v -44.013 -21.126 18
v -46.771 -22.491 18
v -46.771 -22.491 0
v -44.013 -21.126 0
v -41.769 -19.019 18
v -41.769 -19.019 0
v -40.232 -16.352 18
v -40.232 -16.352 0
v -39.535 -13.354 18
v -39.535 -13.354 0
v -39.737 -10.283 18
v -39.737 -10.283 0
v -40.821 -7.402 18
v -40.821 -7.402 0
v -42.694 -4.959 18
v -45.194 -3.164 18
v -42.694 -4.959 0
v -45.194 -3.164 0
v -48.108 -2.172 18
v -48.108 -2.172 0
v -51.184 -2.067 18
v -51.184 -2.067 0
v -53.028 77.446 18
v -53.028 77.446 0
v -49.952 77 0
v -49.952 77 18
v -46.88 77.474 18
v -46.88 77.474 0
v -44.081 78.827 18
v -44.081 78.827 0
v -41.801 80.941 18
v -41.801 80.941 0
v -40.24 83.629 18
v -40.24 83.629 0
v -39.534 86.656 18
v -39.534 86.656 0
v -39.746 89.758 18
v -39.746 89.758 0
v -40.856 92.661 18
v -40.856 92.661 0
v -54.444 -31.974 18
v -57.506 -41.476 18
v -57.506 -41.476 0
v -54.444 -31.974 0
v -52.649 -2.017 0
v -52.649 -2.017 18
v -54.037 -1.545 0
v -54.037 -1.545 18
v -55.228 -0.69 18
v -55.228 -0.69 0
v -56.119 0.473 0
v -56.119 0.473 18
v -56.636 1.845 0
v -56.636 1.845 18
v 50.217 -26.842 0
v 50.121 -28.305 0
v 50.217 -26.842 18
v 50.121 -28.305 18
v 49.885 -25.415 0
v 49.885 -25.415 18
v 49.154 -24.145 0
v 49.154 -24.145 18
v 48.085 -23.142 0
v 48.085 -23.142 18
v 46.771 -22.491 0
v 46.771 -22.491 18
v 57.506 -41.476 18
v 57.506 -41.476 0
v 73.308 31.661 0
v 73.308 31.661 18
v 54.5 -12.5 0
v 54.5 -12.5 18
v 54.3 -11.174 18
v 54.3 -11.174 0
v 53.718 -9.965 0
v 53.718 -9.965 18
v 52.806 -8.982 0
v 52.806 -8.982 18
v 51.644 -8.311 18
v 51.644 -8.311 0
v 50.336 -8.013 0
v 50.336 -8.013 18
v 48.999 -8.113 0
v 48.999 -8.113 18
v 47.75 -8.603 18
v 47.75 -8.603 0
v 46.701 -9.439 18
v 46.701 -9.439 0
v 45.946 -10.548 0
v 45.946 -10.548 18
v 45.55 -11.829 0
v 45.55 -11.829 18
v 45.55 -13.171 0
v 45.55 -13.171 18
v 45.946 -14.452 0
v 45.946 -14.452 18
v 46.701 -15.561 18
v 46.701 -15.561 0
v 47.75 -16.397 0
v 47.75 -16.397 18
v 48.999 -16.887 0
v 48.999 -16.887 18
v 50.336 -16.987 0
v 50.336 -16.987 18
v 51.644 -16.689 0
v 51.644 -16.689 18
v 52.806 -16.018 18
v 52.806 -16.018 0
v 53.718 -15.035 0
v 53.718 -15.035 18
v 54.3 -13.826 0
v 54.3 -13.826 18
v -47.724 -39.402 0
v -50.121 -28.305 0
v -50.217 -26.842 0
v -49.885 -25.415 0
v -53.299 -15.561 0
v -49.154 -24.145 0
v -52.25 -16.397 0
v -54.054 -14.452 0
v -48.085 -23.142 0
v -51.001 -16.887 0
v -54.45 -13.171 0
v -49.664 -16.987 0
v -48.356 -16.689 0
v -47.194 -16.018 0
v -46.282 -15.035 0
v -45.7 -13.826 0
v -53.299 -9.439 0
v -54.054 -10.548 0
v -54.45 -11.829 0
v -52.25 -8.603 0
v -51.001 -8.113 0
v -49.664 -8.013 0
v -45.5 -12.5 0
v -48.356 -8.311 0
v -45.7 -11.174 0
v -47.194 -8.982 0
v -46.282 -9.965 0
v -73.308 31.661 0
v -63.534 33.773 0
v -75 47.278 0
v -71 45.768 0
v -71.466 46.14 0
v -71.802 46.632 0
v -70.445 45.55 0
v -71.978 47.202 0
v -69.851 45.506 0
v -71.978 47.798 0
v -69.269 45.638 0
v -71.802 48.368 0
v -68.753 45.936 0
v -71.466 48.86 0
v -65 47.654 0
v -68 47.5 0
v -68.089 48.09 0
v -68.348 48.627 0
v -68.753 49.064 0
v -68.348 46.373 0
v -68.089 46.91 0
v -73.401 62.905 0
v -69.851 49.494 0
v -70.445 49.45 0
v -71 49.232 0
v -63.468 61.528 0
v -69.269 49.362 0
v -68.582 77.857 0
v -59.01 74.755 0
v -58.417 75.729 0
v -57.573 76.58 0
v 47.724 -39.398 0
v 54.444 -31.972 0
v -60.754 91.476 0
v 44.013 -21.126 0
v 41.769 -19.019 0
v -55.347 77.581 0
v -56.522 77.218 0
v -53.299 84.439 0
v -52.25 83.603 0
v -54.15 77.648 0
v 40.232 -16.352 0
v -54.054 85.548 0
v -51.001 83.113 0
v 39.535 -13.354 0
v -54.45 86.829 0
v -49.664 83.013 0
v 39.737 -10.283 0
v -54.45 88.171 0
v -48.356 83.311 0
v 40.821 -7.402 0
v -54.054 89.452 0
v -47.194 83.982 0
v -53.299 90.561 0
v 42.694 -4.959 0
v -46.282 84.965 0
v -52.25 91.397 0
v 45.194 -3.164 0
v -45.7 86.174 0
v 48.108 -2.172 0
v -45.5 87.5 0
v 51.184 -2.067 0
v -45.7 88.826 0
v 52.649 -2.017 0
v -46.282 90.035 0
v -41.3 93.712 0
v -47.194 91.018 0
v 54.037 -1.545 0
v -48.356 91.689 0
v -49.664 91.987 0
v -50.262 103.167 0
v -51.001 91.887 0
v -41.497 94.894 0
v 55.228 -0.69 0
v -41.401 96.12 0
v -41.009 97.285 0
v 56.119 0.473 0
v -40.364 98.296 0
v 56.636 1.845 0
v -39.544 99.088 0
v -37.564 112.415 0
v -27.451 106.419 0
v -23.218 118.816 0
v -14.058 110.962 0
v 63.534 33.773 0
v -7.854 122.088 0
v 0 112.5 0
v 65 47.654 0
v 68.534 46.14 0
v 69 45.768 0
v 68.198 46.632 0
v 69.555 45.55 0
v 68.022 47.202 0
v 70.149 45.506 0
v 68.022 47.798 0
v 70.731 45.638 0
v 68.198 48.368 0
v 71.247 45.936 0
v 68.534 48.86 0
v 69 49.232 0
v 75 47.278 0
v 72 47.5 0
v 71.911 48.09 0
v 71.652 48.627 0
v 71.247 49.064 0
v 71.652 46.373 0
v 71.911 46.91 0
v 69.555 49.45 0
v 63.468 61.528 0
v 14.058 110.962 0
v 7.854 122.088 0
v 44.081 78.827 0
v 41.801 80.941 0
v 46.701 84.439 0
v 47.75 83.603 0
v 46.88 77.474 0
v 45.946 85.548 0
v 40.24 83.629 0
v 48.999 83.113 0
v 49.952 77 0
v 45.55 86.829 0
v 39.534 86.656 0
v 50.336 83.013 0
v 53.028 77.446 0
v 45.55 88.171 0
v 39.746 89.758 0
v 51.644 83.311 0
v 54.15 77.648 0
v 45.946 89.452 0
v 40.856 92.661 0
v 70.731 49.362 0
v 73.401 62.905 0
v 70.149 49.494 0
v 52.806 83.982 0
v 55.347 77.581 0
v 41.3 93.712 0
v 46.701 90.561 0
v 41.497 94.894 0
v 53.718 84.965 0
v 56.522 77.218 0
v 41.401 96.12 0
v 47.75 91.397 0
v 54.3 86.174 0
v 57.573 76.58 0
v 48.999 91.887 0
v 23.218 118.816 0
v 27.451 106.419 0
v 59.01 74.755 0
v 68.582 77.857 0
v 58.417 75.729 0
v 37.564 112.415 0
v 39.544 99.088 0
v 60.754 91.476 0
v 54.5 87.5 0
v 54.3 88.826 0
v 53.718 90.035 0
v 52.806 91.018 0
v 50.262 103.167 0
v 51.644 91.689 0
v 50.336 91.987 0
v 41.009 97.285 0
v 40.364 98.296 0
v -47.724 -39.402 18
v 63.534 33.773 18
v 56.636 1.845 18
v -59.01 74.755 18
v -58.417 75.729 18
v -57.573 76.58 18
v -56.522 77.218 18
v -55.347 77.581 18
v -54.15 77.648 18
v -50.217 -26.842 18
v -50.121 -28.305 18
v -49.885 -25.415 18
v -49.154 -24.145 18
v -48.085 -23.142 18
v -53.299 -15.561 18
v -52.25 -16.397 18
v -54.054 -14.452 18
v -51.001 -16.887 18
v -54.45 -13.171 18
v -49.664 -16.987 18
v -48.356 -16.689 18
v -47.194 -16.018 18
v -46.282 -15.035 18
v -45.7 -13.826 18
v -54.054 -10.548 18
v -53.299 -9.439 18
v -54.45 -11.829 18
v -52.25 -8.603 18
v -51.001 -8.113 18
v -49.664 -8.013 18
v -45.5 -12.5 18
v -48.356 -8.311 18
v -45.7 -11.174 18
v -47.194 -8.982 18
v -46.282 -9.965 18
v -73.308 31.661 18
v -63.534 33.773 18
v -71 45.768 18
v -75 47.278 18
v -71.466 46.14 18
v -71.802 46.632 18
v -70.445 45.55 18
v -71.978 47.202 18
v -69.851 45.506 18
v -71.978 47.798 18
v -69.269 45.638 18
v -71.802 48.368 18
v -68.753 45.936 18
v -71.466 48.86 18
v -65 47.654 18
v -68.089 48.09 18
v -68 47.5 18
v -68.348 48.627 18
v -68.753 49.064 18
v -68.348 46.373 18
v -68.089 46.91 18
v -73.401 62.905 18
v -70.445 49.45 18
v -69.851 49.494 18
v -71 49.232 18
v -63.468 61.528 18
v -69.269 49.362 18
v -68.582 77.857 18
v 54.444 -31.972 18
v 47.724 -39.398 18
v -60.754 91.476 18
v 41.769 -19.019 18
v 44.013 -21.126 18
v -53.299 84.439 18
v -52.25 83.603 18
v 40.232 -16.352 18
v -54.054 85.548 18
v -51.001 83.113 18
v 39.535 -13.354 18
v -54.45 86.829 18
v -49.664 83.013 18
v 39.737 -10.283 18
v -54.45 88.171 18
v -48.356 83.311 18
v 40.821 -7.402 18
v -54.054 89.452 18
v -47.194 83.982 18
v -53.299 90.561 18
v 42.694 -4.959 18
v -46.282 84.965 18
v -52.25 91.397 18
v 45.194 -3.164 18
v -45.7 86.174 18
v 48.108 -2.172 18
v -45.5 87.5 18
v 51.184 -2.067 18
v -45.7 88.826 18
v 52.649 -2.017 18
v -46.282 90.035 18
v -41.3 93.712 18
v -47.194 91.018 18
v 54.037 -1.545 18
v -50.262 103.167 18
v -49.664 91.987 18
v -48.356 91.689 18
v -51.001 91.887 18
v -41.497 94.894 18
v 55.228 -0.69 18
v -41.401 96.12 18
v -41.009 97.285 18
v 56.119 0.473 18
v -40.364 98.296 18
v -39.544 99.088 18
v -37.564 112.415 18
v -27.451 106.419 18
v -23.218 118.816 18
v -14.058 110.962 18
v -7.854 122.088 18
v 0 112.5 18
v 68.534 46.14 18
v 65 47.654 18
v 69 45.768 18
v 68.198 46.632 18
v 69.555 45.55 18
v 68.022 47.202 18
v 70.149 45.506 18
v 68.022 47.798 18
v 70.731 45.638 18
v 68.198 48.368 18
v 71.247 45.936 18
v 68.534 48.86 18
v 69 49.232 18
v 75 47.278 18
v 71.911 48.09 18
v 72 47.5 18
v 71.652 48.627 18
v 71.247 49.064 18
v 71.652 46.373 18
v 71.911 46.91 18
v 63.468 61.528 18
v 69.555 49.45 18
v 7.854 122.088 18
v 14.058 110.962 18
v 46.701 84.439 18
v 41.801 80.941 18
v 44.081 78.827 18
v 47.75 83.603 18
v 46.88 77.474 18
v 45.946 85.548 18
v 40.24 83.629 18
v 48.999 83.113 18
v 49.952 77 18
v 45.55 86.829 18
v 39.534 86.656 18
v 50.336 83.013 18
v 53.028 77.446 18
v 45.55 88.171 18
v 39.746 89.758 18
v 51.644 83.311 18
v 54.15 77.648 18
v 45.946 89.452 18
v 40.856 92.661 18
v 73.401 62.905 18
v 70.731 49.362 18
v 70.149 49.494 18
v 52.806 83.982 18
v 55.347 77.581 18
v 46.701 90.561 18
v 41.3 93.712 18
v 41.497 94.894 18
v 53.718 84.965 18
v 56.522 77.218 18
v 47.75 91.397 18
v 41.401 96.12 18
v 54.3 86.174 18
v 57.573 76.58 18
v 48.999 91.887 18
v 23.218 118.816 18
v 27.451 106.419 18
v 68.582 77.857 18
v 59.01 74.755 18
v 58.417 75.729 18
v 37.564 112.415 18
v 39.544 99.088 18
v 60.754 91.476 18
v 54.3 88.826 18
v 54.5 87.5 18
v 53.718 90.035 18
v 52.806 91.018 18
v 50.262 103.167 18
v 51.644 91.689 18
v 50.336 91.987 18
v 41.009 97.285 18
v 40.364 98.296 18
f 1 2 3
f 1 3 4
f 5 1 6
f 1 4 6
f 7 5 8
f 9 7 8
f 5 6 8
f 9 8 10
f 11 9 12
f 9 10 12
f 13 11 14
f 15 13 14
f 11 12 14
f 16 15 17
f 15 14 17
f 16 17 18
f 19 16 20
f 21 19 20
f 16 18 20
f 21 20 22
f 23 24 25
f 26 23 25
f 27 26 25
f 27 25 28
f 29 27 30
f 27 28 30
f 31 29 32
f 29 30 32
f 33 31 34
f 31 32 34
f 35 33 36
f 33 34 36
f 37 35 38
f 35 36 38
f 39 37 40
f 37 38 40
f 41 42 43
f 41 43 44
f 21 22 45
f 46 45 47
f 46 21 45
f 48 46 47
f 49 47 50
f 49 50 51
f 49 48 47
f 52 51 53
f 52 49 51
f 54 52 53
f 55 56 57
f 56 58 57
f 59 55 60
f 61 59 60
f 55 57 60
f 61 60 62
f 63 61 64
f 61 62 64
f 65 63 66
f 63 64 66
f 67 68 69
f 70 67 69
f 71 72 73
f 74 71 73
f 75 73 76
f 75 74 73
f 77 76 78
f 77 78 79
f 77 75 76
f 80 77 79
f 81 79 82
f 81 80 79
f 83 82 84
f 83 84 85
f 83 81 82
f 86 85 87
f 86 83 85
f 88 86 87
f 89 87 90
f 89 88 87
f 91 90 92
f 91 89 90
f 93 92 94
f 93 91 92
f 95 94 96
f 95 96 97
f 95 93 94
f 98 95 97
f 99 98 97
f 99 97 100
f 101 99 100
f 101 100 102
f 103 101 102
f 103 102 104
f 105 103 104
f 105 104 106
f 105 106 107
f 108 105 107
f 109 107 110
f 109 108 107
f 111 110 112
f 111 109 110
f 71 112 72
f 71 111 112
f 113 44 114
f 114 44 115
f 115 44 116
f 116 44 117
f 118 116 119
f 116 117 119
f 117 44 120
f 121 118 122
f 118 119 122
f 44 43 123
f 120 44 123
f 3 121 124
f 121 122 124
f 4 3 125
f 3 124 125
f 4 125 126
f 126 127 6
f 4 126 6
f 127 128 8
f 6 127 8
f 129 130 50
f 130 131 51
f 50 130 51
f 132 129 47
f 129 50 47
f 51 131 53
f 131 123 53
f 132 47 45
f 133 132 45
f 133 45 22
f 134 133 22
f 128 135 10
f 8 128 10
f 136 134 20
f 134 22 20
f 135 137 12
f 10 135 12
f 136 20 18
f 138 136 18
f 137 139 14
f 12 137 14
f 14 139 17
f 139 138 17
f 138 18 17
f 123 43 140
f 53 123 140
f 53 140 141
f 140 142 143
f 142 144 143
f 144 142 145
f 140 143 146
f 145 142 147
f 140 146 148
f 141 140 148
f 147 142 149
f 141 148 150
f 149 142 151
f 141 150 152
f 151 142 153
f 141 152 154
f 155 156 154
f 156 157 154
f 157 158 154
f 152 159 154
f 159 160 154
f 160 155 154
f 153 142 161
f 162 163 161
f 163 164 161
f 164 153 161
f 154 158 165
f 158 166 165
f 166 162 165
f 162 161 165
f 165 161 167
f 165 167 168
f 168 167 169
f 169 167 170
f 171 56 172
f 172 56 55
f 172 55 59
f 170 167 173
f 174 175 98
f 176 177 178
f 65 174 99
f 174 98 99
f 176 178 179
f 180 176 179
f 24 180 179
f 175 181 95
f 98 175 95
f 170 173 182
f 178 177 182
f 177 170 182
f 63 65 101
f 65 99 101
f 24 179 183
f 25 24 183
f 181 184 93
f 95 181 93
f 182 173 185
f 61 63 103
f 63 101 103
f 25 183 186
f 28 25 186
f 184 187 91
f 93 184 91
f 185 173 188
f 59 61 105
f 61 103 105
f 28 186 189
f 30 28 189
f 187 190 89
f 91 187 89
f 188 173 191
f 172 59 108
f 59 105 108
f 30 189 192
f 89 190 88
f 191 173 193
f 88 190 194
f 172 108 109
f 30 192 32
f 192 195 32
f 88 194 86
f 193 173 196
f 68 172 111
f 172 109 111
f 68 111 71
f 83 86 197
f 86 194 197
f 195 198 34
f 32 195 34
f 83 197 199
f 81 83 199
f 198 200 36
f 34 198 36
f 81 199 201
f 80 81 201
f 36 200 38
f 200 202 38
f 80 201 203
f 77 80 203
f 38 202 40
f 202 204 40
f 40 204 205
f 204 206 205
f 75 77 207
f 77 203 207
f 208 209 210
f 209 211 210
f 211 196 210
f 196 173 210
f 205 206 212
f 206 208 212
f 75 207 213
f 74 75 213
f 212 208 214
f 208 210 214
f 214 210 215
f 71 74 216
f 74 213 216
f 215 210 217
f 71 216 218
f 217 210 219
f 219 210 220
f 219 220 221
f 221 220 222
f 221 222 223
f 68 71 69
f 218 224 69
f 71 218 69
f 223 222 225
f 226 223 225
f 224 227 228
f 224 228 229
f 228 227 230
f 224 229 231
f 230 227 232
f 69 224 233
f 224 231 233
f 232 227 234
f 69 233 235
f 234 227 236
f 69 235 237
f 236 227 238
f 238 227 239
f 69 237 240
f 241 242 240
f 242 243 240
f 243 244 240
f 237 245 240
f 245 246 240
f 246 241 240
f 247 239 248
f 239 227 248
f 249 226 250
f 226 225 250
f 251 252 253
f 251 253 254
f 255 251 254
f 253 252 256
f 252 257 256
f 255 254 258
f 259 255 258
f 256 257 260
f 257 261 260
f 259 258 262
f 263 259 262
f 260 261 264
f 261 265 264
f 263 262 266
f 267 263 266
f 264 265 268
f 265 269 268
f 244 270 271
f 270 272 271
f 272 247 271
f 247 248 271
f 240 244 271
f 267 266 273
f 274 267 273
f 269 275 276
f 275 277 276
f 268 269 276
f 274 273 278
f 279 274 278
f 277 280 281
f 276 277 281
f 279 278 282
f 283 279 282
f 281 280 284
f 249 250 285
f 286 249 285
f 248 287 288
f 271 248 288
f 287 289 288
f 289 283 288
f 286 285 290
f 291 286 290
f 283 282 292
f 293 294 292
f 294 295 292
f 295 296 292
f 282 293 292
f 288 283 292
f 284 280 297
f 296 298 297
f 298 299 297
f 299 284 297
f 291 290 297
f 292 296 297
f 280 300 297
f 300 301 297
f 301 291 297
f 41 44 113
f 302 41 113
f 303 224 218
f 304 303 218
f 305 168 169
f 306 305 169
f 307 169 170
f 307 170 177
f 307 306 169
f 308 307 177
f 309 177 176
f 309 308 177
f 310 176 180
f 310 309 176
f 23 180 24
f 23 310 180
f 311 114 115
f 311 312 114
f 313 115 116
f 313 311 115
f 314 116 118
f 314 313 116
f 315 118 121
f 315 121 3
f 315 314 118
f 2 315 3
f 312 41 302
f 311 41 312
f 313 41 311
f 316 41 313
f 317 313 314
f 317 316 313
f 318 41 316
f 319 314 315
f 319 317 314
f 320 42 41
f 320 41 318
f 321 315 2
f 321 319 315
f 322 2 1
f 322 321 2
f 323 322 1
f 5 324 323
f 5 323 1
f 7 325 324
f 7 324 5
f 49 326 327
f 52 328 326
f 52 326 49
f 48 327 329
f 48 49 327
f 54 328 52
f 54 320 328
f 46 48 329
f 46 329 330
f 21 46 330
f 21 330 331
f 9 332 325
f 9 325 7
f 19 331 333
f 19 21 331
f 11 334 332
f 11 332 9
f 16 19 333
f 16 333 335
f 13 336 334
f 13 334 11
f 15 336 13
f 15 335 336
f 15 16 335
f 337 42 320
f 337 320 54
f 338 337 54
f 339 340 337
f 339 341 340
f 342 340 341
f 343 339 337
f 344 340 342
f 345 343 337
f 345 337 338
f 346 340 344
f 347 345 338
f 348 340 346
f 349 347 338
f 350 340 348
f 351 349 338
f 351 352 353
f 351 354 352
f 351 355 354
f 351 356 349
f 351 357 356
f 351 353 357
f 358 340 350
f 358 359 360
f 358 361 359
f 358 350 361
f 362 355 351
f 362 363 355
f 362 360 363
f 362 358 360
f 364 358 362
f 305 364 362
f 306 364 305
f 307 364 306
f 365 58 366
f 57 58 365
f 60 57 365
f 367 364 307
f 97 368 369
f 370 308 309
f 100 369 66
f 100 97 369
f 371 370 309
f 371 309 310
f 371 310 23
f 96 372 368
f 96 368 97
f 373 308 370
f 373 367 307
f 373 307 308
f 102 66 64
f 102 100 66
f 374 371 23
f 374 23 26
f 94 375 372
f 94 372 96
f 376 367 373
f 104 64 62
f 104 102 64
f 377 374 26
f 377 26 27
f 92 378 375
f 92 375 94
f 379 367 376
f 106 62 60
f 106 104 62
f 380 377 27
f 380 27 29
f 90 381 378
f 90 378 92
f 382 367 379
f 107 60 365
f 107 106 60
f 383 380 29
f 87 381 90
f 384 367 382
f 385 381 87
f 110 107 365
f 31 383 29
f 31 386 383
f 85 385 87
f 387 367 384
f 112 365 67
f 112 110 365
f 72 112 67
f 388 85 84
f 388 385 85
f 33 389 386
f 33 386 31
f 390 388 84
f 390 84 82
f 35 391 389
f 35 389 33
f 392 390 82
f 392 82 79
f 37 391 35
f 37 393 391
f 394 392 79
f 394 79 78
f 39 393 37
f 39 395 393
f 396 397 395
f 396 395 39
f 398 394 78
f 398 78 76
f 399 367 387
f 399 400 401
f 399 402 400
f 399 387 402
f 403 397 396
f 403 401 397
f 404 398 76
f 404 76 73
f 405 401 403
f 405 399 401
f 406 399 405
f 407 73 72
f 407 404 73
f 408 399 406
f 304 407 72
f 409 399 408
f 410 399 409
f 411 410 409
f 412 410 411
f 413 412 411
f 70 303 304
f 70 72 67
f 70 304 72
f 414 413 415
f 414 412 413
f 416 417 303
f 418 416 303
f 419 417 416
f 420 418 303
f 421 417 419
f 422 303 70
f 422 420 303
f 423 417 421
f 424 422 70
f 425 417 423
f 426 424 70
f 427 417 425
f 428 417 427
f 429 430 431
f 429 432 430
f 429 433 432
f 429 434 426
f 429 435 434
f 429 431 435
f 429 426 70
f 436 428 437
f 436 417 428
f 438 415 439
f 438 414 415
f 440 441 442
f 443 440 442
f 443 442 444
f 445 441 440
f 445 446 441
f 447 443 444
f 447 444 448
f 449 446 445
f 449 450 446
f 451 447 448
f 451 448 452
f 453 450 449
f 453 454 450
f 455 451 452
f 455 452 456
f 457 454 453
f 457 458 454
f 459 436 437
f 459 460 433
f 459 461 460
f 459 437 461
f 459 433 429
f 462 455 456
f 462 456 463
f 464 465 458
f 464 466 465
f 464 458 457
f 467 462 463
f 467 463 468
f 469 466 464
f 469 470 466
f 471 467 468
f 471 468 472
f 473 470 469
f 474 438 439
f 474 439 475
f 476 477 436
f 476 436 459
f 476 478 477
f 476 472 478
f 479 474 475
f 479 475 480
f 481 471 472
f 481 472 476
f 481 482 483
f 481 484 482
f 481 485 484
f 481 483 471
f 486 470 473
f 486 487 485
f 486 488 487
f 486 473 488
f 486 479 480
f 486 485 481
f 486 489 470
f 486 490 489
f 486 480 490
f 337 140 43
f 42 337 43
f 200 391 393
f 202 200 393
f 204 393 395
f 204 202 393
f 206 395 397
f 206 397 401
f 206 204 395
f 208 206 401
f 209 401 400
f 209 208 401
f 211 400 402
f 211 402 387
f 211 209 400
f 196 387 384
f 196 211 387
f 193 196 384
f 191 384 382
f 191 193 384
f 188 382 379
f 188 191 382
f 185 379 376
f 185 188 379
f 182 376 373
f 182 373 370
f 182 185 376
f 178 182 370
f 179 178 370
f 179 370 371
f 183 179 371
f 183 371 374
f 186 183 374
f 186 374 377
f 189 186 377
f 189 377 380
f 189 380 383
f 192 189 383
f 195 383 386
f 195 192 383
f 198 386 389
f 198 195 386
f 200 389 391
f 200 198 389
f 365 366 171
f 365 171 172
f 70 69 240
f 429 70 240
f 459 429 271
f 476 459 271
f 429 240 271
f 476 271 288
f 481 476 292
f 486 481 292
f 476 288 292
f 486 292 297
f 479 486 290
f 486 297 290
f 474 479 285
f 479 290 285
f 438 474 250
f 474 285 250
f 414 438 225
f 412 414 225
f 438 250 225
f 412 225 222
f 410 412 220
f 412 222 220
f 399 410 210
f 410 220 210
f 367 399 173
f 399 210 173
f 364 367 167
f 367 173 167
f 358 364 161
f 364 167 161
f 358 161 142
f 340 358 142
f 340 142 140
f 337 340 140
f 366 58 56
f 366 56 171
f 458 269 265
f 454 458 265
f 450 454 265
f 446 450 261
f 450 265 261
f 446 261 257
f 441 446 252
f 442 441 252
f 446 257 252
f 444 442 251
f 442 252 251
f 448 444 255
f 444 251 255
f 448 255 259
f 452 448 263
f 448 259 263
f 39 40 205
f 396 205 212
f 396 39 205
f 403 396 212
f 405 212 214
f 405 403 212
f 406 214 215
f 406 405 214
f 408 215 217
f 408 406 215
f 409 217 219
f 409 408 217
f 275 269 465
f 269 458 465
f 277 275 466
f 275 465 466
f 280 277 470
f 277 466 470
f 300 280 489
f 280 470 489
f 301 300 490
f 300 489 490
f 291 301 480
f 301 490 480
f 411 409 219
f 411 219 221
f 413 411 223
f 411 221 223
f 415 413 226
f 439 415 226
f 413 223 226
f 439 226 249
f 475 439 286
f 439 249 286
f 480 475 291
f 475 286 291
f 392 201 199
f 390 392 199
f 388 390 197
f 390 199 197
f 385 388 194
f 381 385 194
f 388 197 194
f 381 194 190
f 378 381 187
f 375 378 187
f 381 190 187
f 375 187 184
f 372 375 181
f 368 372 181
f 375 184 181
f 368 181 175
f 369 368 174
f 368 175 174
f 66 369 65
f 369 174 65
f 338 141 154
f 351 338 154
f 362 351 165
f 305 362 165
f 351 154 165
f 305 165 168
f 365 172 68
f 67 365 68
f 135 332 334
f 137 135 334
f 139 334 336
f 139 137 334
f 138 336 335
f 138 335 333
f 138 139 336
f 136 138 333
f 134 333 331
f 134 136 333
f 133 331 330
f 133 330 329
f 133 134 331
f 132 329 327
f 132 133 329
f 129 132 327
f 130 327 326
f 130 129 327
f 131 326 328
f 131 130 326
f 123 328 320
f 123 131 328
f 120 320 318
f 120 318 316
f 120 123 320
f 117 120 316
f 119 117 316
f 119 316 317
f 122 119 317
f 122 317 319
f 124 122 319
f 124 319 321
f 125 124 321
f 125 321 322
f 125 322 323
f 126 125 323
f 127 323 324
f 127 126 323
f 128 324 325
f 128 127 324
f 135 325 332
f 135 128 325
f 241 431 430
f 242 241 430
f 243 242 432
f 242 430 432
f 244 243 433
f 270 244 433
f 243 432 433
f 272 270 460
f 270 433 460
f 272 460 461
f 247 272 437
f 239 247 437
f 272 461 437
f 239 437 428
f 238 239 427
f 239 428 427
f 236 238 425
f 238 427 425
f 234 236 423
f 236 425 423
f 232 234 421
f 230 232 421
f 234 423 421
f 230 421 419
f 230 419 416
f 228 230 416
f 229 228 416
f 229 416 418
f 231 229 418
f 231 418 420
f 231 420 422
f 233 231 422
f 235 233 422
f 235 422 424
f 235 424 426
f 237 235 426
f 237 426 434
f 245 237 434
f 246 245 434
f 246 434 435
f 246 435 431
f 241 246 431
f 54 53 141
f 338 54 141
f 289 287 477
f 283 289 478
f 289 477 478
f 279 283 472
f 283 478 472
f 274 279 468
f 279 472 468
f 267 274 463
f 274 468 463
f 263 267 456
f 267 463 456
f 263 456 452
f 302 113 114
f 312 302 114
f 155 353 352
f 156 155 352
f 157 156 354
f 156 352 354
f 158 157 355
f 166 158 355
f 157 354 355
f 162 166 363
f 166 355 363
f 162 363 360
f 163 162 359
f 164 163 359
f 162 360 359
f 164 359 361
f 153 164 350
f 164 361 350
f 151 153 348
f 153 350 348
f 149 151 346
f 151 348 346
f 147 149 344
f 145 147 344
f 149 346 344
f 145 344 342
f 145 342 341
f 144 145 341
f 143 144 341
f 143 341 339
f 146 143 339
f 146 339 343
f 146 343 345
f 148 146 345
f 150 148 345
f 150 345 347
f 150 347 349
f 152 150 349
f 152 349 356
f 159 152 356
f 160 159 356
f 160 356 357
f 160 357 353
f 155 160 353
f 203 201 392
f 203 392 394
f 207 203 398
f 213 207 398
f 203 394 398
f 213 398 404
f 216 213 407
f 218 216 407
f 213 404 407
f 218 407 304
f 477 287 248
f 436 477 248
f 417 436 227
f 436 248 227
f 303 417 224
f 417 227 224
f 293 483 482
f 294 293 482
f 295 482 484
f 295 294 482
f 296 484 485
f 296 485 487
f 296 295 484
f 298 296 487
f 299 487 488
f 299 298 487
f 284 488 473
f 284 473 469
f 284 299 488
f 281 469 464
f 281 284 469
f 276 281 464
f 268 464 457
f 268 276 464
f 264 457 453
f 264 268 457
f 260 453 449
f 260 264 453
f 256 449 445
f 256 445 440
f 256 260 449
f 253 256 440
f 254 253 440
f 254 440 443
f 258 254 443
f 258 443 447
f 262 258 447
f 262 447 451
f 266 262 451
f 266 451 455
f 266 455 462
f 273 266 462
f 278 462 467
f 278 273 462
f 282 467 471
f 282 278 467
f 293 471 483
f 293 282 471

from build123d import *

# Parameters (mm, degrees)
SKETCH3_R           = 4.5
BOSS_EXTRUDE1_DEPTH = 18
FILLET1_R           = 5
FILLET2_R           = 5
CUT_EXTRUDE2_DEPTH  = 19.0000001
SKETCH6_R           = 2
CUT_EXTRUDE3_DEPTH  = 19.0000001


with BuildPart() as part:
    # Sketch3 → Boss-Extrude1 (new body)
    with BuildSketch(Plane.XY):
        with BuildLine():
            Line((-31.929873349, -122.5), (31.929873349, -122.5))
            ThreePointArc((31.929873349, -122.5), (38.210043039, -120.281996444), (41.704324989, -114.611893732))
            Line((41.704324989, -114.611893732), (73.308387301, 31.660797012))
            ThreePointArc((73.308387301, 31.660797012), (0, 122.5), (-73.308387301, 31.660797012))
            Line((-73.308387301, 31.660797012), (-41.704324989, -114.611893732))
            ThreePointArc((-41.704324989, -114.611893732), (-38.210043039, -120.281996444), (-31.929873349, -122.5))
        make_face()
        with Locations((50, -12.5)):
            Circle(SKETCH3_R, mode=Mode.SUBTRACT)
        with Locations((50, 87.5)):
            Circle(SKETCH3_R, mode=Mode.SUBTRACT)
        with Locations((-50, 87.5)):
            Circle(SKETCH3_R, mode=Mode.SUBTRACT)
        with Locations((-50, -12.5)):
            Circle(SKETCH3_R, mode=Mode.SUBTRACT)
        with BuildLine():
            Line((-31.929873349, -112.5), (-51.284518999, -22.921132901))
            ThreePointArc((-51.284518999, -22.921132901), (-39.736825778, -10.282511582), (-55.472323677, -3.538768301))
            Line((-55.472323677, -3.538768301), (-63.533935661, 33.772690744))
            ThreePointArc((-63.533935661, 33.772690744), (-64.271528905, 57.204152316), (-56.648842383, 79.373322021))
            ThreePointArc((-56.648842383, 79.373322021), (-41.800877501, 80.940702001), (-43.531035666, 95.770580418))
            ThreePointArc((-43.531035666, 95.770580418), (0, 112.5), (43.531035666, 95.770580418))
            ThreePointArc((43.531035666, 95.770580418), (41.800877501, 80.940702001), (56.648842383, 79.373322021))
            ThreePointArc((56.648842383, 79.373322021), (64.271528905, 57.204152316), (63.533935661, 33.772690744))
            Line((63.533935661, 33.772690744), (55.472323677, -3.538768301))
            ThreePointArc((55.472323677, -3.538768301), (39.736825778, -10.282511582), (51.284518999, -22.921132901))
            Line((51.284518999, -22.921132901), (31.929873349, -112.5))
            Line((31.929873349, -112.5), (-31.929873349, -112.5))
        make_face(mode=Mode.SUBTRACT)
    extrude(amount=BOSS_EXTRUDE1_DEPTH)

    # Fillet1
    fillet1_edges = [part.edges().sort_by_distance(p)[0] for p in [
        (-31.929873349, -112.5, 9),
        (31.929873349, -112.5, 9),
    ]]
    fillet(fillet1_edges, radius=FILLET1_R)

    # Fillet2
    fillet2_edges = [part.edges().sort_by_distance(p)[0] for p in [
        (51.284518999, -22.921132901, 9),
        (55.472323677, -3.538768301, 9),
        (56.648842383, 79.373322021, 9),
        (43.531035666, 95.770580418, 9),
        (-43.531035666, 95.770580418, 9),
        (-56.648842383, 79.373322021, 9),
        (-55.472323677, -3.538768301, 9),
        (-51.284518999, -22.921132901, 9),
    ]]
    fillet(fillet2_edges, radius=FILLET2_R)

    # Sketch5 → Cut-Extrude2 (cut, through all)
    with BuildSketch(Plane.XY.offset(18)):
        Polygon((47.724403212, -39.39837277), (54.444339069, -31.972010438), (57.506356145, -41.47554836), (70.328868077, -126.043088926), (-63.485047771, -126.043088926), (-57.506356145, -41.47554836), (-54.443982463, -31.973660914), (-47.723687693, -39.401684395), align=None)
    extrude(amount=-CUT_EXTRUDE2_DEPTH, mode=Mode.SUBTRACT)

    # Sketch6 → Cut-Extrude3 (cut, through all)
    with BuildSketch(Plane.XY.offset(18)):
        with Locations((-70, 47.5)):
            Circle(SKETCH6_R)
        with Locations((70, 47.5)):
            Circle(SKETCH6_R)
    extrude(amount=-CUT_EXTRUDE3_DEPTH, mode=Mode.SUBTRACT)


solid = part.part
